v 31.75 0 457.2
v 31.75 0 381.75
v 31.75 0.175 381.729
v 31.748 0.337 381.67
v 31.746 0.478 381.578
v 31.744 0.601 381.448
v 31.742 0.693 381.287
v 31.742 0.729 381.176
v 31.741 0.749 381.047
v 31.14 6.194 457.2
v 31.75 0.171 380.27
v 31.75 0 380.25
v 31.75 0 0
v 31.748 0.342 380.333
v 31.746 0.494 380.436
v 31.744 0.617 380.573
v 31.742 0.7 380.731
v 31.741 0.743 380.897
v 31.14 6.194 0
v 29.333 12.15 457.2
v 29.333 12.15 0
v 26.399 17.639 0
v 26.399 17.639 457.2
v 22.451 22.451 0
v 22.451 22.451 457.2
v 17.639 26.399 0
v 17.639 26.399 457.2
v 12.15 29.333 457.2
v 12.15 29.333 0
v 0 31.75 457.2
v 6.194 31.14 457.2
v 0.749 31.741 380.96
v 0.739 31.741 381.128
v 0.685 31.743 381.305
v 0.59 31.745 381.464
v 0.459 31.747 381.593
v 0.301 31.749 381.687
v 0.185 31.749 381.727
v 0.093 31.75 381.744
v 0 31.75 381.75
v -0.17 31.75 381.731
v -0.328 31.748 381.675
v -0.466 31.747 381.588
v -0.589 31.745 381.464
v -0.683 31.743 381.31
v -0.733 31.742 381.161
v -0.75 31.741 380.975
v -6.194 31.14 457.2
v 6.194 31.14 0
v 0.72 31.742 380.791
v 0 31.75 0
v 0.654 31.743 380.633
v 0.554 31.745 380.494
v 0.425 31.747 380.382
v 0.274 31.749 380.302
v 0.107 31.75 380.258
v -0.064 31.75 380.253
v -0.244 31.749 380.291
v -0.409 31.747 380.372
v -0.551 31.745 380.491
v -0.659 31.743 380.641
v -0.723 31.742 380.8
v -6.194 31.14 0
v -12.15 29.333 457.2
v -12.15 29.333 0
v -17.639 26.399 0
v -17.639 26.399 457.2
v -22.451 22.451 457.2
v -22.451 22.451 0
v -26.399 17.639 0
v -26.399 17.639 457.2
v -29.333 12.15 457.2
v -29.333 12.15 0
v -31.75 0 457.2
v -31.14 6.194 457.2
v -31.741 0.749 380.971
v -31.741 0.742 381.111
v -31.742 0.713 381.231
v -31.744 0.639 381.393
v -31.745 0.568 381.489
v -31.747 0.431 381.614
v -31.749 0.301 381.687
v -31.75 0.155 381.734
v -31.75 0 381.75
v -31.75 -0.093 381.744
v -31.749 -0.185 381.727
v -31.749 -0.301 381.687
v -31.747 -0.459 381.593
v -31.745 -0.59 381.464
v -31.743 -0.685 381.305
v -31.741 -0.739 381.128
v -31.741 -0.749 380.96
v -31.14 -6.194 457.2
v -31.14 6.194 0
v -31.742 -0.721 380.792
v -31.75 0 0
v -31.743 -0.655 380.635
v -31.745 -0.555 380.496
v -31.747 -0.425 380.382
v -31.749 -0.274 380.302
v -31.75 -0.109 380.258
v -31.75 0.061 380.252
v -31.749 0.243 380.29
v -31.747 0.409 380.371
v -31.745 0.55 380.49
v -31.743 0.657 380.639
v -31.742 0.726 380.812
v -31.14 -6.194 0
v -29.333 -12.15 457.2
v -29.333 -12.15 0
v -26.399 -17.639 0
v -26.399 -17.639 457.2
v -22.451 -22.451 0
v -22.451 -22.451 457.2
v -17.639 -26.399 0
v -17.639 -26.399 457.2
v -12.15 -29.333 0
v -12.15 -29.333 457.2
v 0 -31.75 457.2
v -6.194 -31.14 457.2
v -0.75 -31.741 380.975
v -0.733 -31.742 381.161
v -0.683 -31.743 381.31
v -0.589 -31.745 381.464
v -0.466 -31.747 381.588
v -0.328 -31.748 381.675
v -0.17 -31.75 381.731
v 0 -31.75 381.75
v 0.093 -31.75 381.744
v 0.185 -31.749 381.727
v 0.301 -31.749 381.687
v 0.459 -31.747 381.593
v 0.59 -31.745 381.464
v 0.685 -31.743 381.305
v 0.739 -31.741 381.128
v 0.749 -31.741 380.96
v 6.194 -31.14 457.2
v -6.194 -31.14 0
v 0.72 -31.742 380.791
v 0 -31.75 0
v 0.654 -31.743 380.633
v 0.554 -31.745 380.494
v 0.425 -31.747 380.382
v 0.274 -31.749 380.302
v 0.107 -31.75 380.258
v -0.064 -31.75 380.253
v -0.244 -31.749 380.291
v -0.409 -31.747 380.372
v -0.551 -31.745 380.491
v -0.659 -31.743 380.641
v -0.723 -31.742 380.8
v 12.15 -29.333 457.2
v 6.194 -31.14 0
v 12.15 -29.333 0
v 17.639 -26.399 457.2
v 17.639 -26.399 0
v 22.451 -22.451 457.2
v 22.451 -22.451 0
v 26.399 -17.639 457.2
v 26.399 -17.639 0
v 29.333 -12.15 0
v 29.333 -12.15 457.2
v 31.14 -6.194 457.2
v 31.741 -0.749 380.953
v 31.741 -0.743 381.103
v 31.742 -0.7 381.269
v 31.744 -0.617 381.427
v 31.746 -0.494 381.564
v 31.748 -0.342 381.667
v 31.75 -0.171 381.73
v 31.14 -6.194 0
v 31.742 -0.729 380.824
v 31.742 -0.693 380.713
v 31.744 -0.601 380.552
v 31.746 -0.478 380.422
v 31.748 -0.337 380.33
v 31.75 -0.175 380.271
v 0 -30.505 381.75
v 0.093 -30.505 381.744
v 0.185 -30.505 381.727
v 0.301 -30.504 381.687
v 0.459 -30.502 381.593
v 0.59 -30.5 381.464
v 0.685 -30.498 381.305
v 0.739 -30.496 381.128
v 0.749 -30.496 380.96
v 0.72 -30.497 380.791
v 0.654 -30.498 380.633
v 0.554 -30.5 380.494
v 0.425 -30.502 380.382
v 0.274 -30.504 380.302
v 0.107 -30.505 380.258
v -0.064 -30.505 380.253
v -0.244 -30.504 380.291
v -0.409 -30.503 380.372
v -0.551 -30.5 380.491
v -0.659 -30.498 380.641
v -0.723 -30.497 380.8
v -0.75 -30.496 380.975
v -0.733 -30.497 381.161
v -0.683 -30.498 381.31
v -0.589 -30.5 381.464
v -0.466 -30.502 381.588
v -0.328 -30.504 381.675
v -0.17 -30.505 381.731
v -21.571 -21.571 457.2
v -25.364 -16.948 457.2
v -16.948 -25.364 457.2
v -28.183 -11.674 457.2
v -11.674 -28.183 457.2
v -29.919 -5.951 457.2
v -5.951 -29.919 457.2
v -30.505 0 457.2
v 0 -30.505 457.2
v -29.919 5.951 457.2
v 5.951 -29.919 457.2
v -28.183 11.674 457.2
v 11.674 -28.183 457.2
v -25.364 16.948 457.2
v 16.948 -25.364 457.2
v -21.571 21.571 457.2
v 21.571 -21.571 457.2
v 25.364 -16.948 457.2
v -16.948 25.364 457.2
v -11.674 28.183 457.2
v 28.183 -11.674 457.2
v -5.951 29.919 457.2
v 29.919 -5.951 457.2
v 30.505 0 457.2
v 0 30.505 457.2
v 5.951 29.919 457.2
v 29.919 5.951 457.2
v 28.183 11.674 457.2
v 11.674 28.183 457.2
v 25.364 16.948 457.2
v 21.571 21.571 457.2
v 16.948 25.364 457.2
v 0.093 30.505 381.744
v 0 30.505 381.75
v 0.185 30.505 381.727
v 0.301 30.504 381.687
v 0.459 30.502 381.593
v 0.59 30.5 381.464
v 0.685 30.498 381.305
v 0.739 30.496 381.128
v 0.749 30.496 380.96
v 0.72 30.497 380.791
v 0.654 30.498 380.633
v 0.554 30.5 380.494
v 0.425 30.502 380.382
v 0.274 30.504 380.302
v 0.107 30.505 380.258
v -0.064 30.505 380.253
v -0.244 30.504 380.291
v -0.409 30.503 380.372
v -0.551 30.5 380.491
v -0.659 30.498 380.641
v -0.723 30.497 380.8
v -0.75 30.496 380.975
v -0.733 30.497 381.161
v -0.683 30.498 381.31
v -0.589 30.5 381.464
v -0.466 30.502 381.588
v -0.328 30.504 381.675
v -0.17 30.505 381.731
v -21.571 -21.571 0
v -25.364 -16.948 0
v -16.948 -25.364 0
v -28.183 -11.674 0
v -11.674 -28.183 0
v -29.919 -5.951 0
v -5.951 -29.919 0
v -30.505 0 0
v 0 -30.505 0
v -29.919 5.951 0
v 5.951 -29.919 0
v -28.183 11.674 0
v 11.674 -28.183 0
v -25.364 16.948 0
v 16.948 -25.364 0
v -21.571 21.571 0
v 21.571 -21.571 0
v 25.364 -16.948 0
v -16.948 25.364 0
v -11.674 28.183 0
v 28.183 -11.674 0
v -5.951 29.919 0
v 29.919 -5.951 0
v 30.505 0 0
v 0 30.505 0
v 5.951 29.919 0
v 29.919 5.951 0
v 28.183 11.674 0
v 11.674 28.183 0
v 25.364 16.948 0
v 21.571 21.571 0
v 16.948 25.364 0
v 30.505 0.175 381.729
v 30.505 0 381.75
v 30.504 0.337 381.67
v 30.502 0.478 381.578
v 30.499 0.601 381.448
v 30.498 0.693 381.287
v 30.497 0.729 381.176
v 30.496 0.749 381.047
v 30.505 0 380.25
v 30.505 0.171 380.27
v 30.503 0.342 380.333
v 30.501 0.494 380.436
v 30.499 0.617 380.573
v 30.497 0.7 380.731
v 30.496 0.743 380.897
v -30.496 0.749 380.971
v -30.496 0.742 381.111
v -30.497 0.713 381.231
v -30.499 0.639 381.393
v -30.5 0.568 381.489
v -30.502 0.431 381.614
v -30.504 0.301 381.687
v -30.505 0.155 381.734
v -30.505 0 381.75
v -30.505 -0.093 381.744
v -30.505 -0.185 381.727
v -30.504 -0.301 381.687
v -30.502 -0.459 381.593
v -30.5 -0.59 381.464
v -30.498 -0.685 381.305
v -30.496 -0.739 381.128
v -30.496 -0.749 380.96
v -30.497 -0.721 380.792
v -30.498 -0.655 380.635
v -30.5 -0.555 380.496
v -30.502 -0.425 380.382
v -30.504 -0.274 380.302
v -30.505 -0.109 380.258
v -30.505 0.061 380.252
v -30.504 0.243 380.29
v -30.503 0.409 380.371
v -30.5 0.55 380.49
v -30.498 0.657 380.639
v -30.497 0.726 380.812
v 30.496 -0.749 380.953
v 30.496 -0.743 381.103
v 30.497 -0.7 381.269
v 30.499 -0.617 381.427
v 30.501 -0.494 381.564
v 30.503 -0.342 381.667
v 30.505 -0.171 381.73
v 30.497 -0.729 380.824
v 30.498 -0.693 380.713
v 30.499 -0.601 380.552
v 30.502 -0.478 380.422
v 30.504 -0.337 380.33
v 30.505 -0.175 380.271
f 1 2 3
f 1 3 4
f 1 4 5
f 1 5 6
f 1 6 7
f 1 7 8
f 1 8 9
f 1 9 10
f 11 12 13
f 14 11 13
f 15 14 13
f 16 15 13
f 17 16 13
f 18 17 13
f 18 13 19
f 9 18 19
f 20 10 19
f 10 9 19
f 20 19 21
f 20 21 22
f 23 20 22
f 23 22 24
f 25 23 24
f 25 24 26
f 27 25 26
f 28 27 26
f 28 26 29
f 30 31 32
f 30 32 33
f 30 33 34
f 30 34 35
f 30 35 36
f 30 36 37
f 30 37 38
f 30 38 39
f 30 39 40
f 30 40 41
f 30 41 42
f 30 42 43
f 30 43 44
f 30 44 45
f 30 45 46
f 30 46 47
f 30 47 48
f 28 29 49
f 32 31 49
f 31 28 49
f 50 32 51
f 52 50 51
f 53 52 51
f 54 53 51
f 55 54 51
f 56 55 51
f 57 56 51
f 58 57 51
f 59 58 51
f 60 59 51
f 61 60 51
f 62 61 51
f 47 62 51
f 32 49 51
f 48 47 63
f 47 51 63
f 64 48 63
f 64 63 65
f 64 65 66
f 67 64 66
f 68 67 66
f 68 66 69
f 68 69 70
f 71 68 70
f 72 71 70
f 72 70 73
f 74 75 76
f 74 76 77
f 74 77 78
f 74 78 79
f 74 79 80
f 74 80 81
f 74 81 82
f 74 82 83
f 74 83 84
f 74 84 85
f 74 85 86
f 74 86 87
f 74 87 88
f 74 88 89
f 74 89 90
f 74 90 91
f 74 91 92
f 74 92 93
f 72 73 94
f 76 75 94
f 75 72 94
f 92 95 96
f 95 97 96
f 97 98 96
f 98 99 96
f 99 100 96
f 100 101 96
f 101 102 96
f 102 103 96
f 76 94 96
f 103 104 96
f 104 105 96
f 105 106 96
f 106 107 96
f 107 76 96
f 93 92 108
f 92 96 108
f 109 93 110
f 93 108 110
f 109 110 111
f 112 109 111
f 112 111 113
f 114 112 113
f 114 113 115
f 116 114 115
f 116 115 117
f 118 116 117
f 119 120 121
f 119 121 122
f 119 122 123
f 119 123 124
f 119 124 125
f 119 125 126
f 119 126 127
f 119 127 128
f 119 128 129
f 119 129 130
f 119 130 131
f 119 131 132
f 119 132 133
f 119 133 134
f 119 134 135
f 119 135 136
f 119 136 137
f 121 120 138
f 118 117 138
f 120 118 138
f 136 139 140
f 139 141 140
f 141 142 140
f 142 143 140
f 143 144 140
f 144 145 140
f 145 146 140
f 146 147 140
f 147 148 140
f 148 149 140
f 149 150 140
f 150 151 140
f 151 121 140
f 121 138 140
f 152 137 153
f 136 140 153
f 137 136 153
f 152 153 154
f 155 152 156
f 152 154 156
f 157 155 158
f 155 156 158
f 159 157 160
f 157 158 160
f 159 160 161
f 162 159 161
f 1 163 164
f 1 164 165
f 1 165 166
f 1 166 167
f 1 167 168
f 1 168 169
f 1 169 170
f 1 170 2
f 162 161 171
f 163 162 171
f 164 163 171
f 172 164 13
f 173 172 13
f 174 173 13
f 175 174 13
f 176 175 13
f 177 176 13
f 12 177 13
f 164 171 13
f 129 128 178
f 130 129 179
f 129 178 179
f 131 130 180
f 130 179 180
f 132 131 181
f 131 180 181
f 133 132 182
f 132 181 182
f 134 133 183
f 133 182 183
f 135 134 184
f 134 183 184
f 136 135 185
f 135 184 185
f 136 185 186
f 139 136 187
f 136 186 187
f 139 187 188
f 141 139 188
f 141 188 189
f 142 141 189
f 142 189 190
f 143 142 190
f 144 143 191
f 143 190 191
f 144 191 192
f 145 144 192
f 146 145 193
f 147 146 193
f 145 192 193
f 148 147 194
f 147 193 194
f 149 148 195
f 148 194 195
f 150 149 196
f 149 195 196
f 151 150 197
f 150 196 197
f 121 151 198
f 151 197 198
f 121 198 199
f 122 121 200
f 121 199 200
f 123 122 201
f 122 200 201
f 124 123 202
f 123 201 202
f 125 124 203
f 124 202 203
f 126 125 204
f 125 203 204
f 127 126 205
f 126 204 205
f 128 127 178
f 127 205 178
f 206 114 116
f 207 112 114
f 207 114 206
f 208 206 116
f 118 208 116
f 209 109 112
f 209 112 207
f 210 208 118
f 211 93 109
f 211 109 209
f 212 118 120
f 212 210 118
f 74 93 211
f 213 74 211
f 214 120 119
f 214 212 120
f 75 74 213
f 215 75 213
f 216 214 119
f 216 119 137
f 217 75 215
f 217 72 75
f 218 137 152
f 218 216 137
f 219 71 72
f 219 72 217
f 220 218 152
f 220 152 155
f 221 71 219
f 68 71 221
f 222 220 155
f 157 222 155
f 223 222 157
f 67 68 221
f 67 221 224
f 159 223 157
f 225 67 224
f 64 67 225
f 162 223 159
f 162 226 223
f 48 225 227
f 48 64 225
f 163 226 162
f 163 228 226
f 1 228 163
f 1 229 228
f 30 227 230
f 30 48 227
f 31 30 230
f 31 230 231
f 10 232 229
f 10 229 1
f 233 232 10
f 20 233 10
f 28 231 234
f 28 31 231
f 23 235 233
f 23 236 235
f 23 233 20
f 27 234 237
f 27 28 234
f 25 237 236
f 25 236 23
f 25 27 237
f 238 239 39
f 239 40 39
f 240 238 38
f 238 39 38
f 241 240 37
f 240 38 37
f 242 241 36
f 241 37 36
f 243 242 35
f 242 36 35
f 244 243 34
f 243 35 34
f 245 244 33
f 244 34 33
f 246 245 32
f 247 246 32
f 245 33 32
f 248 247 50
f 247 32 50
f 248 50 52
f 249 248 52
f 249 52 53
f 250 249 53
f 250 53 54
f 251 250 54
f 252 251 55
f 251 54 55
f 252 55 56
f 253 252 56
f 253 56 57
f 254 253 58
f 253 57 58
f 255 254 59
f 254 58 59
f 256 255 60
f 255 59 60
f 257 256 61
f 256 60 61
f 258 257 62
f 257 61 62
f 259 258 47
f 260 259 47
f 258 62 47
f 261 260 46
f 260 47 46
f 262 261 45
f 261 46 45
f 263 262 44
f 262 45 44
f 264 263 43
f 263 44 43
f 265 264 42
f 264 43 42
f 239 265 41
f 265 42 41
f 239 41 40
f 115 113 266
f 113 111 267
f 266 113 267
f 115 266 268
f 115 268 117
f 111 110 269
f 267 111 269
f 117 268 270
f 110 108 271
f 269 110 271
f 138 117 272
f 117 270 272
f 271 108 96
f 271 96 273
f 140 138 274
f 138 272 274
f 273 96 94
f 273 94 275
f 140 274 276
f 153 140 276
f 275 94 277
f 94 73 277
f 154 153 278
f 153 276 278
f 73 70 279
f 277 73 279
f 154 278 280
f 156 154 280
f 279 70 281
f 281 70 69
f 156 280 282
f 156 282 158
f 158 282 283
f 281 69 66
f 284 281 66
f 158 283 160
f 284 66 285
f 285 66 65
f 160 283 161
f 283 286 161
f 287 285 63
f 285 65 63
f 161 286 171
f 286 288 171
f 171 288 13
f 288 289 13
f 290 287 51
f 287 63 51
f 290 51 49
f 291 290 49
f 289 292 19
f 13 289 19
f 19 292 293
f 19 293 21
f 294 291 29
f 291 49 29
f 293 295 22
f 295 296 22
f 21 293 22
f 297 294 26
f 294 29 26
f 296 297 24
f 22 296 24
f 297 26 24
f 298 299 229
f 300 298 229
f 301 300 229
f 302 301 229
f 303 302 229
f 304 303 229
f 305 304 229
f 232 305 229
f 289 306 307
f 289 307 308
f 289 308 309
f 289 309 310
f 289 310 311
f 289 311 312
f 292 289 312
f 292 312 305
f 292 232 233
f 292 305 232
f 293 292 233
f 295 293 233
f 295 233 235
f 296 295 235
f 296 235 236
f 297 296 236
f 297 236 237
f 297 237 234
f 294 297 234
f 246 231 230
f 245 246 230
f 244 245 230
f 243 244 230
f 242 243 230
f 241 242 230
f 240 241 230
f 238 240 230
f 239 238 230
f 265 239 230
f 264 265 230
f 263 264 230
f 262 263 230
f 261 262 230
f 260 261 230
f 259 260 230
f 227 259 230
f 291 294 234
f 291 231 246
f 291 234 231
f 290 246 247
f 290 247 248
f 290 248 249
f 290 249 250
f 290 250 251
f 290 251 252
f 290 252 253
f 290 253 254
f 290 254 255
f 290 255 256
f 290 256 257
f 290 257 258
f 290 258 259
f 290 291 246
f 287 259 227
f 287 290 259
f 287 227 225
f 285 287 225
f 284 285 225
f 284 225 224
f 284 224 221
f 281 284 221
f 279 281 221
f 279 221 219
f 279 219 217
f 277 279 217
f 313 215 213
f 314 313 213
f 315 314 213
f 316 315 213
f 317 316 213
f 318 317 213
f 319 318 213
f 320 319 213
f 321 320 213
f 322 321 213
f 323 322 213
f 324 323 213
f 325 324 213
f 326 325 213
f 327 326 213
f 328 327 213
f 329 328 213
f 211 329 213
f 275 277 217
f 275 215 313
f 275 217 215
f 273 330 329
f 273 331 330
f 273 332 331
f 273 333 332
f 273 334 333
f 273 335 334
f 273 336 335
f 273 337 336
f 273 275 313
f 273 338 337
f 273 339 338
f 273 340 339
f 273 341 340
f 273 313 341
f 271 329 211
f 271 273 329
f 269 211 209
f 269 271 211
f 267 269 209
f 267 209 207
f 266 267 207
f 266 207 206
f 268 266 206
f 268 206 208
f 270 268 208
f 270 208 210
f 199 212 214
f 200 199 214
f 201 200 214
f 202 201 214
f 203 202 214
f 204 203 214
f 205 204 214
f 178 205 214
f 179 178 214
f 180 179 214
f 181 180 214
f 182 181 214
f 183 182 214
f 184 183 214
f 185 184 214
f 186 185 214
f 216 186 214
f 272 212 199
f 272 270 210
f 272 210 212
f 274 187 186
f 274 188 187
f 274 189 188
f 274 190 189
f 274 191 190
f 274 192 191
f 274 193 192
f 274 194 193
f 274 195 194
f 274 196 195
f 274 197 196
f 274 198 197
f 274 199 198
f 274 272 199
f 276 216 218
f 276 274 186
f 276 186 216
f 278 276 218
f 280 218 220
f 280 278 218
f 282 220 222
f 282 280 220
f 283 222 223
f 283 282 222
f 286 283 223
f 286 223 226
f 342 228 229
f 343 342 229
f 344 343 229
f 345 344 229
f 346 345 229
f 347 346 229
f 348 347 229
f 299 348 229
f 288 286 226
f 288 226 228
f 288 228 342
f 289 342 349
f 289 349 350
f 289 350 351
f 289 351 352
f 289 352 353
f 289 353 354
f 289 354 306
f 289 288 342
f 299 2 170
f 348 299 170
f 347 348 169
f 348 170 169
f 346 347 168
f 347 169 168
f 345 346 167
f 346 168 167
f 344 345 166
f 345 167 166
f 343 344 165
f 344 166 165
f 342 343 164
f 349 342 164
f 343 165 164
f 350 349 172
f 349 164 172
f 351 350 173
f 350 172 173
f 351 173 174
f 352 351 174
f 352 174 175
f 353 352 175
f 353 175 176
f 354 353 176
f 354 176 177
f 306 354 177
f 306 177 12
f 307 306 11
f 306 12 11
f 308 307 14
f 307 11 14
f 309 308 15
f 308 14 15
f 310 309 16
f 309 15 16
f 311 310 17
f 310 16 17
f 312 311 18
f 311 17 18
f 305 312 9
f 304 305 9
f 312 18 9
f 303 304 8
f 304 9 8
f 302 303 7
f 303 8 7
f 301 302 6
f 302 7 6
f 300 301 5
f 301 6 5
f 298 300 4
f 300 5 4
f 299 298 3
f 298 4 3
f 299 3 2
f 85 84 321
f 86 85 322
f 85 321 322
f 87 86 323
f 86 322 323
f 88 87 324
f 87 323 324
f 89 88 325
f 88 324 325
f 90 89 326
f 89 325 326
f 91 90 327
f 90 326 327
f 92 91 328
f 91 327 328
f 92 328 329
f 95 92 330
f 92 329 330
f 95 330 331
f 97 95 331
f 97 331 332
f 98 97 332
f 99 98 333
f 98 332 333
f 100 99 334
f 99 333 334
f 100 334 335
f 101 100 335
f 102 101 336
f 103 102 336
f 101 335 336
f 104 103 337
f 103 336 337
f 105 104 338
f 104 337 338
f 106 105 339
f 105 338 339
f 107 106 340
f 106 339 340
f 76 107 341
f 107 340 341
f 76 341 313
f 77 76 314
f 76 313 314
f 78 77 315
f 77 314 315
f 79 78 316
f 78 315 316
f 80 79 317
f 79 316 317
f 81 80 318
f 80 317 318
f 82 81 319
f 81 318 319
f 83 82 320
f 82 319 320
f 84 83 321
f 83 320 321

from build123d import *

# Parameters (mm, degrees)
SKETCH1_R           = 31.75
SKETCH1_R_2         = 30.5054
BOSS_EXTRUDE1_DEPTH = 457.2
SKETCH3_R           = 0.75
CUT_EXTRUDE1_DEPTH  = 460.399570091
CIRPATTERN1_COUNT   = 4


with BuildPart() as part:
    # Sketch1 → Boss-Extrude1 (new body)
    with BuildSketch(Plane.XY):
        Circle(SKETCH1_R)
        Circle(SKETCH1_R_2, mode=Mode.SUBTRACT)
    extrude(amount=BOSS_EXTRUDE1_DEPTH)

    # Sketch3 → Cut-Extrude1 (cut, symmetric)
    with BuildSketch(Plane(origin=(0, 0, 0), x_dir=(1, 0, 0), z_dir=(0, 1, 0))):
        with Locations(Location((0, -381, 0), (0, 0, 270))):
            Circle(SKETCH3_R)
    cut_extrude1 = extrude(amount=CUT_EXTRUDE1_DEPTH, both=True, mode=Mode.SUBTRACT)

    # CirPattern1: Cut-Extrude1 ×4 about axis
    cirpattern1_axis = Axis((0, 0, 457.2), (0, 0, -1))
    for i in range(1, CIRPATTERN1_COUNT):
        add(cut_extrude1.rotate(cirpattern1_axis, i * 360 / CIRPATTERN1_COUNT), mode=Mode.SUBTRACT)


solid = part.part
